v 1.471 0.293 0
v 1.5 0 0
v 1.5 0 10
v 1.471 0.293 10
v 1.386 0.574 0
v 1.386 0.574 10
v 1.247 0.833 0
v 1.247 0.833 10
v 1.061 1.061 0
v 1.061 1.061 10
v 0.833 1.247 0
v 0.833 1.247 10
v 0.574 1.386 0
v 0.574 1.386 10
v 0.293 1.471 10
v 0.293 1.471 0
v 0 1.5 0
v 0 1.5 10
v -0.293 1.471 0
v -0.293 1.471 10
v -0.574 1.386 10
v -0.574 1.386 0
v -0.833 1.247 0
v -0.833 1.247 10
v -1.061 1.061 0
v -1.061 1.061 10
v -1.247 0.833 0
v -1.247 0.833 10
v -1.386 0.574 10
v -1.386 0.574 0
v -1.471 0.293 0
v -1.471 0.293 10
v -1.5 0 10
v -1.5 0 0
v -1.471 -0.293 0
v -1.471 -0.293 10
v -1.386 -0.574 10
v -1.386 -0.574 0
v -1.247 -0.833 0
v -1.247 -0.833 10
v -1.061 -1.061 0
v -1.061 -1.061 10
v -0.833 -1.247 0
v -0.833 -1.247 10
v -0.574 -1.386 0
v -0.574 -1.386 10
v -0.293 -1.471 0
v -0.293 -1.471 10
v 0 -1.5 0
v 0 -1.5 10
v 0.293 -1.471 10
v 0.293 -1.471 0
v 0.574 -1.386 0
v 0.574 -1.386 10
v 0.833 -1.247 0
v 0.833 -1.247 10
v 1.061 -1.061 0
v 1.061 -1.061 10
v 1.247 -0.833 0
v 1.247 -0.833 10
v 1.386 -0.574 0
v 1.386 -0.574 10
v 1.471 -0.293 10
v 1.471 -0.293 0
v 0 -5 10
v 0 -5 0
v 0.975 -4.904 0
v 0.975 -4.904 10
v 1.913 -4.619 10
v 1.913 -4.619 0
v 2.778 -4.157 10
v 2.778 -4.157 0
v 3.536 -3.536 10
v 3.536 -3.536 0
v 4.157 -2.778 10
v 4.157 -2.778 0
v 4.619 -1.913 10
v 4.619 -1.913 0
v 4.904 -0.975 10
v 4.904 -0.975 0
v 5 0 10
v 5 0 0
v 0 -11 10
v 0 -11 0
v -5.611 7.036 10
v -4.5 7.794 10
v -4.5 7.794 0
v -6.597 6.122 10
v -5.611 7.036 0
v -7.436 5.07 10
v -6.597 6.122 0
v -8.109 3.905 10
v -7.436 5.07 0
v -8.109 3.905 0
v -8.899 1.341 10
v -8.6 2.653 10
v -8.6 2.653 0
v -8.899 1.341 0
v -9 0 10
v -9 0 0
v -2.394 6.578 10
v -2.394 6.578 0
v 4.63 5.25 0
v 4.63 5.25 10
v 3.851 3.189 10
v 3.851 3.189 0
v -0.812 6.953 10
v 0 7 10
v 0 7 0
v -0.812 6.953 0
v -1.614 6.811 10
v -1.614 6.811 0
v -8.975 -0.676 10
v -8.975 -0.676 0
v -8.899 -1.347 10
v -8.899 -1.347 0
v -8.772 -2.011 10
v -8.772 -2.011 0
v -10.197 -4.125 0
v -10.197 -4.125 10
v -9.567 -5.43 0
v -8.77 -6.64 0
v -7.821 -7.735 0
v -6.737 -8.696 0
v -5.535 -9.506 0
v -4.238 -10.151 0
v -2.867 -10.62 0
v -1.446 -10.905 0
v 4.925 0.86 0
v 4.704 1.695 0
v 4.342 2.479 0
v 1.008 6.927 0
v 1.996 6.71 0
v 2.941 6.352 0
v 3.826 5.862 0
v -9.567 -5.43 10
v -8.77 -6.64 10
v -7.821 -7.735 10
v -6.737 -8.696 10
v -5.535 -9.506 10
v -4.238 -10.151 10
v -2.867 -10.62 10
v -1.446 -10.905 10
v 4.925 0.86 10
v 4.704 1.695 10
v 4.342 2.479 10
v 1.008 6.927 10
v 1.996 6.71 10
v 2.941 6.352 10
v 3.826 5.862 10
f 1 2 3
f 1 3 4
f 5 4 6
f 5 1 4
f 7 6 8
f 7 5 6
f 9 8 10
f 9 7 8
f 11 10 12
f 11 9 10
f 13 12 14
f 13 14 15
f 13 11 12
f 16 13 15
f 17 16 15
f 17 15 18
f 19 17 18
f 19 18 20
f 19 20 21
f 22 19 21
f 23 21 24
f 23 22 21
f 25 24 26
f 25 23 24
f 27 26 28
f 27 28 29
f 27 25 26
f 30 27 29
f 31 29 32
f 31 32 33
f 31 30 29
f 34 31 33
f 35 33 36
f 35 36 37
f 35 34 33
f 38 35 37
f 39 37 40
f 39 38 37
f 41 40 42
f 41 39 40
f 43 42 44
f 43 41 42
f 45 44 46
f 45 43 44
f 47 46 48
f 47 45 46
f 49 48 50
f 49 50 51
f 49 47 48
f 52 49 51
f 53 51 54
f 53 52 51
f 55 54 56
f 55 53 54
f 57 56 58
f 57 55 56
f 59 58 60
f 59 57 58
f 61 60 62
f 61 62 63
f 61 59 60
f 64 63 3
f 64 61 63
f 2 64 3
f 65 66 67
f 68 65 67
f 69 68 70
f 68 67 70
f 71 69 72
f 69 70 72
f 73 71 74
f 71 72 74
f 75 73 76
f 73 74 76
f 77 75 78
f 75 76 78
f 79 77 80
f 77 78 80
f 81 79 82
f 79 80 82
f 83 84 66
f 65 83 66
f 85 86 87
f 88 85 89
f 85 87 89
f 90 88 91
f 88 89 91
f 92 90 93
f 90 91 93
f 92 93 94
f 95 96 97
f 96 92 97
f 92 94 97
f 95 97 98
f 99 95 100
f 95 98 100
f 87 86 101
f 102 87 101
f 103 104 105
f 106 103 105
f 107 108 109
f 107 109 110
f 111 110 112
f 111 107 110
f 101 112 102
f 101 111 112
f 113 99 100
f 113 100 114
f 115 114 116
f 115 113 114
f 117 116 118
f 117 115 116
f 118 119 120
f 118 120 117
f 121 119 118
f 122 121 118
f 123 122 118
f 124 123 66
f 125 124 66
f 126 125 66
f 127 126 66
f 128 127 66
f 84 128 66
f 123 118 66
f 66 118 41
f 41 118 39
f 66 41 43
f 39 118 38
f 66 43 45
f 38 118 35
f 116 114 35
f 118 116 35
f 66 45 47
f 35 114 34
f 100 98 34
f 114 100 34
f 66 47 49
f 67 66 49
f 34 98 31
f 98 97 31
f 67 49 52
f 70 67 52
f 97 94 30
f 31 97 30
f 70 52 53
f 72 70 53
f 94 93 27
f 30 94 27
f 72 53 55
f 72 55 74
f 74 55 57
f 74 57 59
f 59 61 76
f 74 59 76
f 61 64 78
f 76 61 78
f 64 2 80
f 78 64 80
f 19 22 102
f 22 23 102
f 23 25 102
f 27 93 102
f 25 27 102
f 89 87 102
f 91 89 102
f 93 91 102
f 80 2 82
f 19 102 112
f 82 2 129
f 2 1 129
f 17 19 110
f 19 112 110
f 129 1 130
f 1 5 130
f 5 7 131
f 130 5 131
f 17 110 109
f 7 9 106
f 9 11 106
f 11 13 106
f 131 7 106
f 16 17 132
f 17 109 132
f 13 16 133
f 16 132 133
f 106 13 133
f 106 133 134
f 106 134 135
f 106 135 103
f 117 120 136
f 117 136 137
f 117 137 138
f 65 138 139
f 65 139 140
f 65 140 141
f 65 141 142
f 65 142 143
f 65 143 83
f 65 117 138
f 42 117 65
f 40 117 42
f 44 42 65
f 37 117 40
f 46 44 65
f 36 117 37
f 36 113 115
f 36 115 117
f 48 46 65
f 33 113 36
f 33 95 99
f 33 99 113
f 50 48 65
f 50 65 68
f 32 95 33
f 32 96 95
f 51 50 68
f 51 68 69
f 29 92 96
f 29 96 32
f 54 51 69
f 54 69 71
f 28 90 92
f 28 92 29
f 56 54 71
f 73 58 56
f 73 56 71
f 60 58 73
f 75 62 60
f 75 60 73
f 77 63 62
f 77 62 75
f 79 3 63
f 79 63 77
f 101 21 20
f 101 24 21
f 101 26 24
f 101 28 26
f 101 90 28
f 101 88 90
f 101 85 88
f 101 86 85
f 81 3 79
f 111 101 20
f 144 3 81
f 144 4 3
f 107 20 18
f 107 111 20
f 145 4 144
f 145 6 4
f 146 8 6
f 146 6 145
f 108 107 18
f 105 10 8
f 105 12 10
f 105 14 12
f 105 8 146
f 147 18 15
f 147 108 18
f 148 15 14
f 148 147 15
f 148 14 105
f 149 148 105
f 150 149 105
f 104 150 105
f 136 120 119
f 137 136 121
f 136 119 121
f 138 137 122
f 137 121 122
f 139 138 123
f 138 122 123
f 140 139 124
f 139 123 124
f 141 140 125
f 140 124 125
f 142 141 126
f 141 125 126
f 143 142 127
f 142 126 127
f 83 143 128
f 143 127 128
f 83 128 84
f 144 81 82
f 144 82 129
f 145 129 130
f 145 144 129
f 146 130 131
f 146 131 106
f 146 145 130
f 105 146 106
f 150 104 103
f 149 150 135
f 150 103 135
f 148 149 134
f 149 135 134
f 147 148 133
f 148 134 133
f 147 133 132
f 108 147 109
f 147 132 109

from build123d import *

# Parameters (mm, degrees)
F0_R         = 11
F0_R_2       = 1.5
F1_DEPTH     = 10
F3_DEPTH     = 25
F4_T4_DEPTH  = 31.4403610405
F4_S5_R      = 9
F4_T6_DEPTH  = 17
F4_T10_DEPTH = 33.7217724143
F4_S11_R     = 7
F4_T12_DEPTH = 19
F4_T16_DEPTH = 39.2279914145
F4_S17_R     = 5
F4_T18_DEPTH = 21


# Not quite as in the source:
# - a fillet or chamfer that OpenCascade refuses, or shapes differently, is made with other operations: its cross-section is extruded or revolved along the edge and cut away or added


with BuildPart() as f1:
    # F0 (on Top) → F1 (new body)
    with BuildSketch(Plane.XY):
        Circle(F0_R)
        Circle(F0_R_2, mode=Mode.SUBTRACT)
    extrude(amount=F1_DEPTH)

    # F2 (on face) → F3 (cut)
    with BuildSketch(Plane(origin=(0, 0, 0), x_dir=(1, 0, 0), z_dir=(0, 0, -1))):
        with BuildLine():
            ThreePointArc((0, -9), (-6.3639610307, -6.3639610307), (-9, 0))
            Line((-9, 0), (-11, 0))
            ThreePointArc((-11, 0), (-7.7781745931, -7.7781745931), (0, -11))
            Line((0, -11), (0, -9))
        make_face()
        with BuildLine():
            Line((11, 0), (9, 0))
            ThreePointArc((9, 0), (6.3639610307, -6.3639610307), (0, -9))
            Line((0, -9), (0, -11))
            ThreePointArc((0, -11), (7.7781745931, -7.7781745931), (11, 0))
        make_face()
        with BuildLine():
            Line((9, 0), (7, 0))
            ThreePointArc((7, 0), (4.9497474683, -4.9497474683), (0, -7))
            Line((0, -7), (0, -9))
            ThreePointArc((0, -9), (6.3639610307, -6.3639610307), (9, 0))
        make_face()
        with BuildLine():
            Line((0, 7), (0, 5))
            ThreePointArc((0, 5), (3.5355339059, 3.5355339059), (5, 0))
            Line((5, 0), (7, 0))
            ThreePointArc((7, 0), (4.9497474683, 4.9497474683), (0, 7))
        make_face()
        with BuildLine():
            Line((0, 9), (0, 7))
            ThreePointArc((0, 7), (4.9497474683, 4.9497474683), (7, 0))
            Line((7, 0), (9, 0))
            ThreePointArc((9, 0), (6.3639610307, 6.3639610307), (0, 9))
        make_face()
        with BuildLine():
            Line((0, 11), (0, 9))
            ThreePointArc((0, 9), (6.3639610307, 6.3639610307), (9, 0))
            Line((9, 0), (11, 0))
            ThreePointArc((11, 0), (7.7781745931, 7.7781745931), (0, 11))
        make_face()
    extrude(amount=-F3_DEPTH, mode=Mode.SUBTRACT)

    # F4: chamfer of 3 on 3 edges, made by hand


with BuildPart() as f4_tool2:
    # F4_s3 → F4_t4 (new body)
    with BuildSketch(Plane.XY.offset(-10.7201805202)):
        with BuildLine():
            Line((-10.1972729198, -4.125), (-7.4161984871, 0))
            Line((-7.4161984871, 0), (-11, 0))
            ThreePointArc((-11, 0), (-10.7891469286, -2.1434338231), (-10.1972729198, -4.125))
        make_face()
    extrude(amount=F4_T4_DEPTH)

    # F4_s5 → F4_t6 (cut, symmetric)
    with BuildSketch(Plane.XY.offset(5)):
        Circle(F4_S5_R)
    extrude(amount=F4_T6_DEPTH, both=True, mode=Mode.SUBTRACT)


with BuildPart() as f1_1:
    add(f1.part)

    # F4_t1: cut F4_tool2
    add(f4_tool2.part, mode=Mode.SUBTRACT)


with BuildPart() as f4_tool8:
    # F4_s9 → F4_t10 (new body)
    with BuildSketch(Plane.XY.offset(-11.8608862072)):
        with BuildLine():
            Line((-4.5, 7.7942286341), (0, 5.1961524227))
            Line((0, 5.1961524227), (0, 9))
            ThreePointArc((0, 9), (-2.3715637944, 8.6819171367), (-4.5, 7.7942286341))
        make_face()
    extrude(amount=F4_T10_DEPTH)

    # F4_s11 → F4_t12 (cut, symmetric)
    with BuildSketch(Plane.XY.offset(5)):
        Circle(F4_S11_R)
    extrude(amount=F4_T12_DEPTH, both=True, mode=Mode.SUBTRACT)


with BuildPart() as f1_2:
    add(f1_1.part)

    # F4_t7: cut F4_tool8
    add(f4_tool8.part, mode=Mode.SUBTRACT)


with BuildPart() as f4_tool14:
    # F4_s15 → F4_t16 (new body)
    with BuildSketch(Plane.XY.offset(-14.6139957073)):
        with BuildLine():
            Line((4.6300647944, 5.25), (2.6457513111, 0))
            Line((2.6457513111, 0), (7, 0))
            ThreePointArc((7, 0), (6.3609005548, 2.9221471784), (4.6300647944, 5.25))
        make_face()
    extrude(amount=F4_T16_DEPTH)

    # F4_s17 → F4_t18 (cut, symmetric)
    with BuildSketch(Plane.XY.offset(5)):
        Circle(F4_S17_R)
    extrude(amount=F4_T18_DEPTH, both=True, mode=Mode.SUBTRACT)


with BuildPart() as f1_3:
    add(f1_2.part)

    # F4_t13: cut F4_tool14
    add(f4_tool14.part, mode=Mode.SUBTRACT)


solid = f1_3.part
